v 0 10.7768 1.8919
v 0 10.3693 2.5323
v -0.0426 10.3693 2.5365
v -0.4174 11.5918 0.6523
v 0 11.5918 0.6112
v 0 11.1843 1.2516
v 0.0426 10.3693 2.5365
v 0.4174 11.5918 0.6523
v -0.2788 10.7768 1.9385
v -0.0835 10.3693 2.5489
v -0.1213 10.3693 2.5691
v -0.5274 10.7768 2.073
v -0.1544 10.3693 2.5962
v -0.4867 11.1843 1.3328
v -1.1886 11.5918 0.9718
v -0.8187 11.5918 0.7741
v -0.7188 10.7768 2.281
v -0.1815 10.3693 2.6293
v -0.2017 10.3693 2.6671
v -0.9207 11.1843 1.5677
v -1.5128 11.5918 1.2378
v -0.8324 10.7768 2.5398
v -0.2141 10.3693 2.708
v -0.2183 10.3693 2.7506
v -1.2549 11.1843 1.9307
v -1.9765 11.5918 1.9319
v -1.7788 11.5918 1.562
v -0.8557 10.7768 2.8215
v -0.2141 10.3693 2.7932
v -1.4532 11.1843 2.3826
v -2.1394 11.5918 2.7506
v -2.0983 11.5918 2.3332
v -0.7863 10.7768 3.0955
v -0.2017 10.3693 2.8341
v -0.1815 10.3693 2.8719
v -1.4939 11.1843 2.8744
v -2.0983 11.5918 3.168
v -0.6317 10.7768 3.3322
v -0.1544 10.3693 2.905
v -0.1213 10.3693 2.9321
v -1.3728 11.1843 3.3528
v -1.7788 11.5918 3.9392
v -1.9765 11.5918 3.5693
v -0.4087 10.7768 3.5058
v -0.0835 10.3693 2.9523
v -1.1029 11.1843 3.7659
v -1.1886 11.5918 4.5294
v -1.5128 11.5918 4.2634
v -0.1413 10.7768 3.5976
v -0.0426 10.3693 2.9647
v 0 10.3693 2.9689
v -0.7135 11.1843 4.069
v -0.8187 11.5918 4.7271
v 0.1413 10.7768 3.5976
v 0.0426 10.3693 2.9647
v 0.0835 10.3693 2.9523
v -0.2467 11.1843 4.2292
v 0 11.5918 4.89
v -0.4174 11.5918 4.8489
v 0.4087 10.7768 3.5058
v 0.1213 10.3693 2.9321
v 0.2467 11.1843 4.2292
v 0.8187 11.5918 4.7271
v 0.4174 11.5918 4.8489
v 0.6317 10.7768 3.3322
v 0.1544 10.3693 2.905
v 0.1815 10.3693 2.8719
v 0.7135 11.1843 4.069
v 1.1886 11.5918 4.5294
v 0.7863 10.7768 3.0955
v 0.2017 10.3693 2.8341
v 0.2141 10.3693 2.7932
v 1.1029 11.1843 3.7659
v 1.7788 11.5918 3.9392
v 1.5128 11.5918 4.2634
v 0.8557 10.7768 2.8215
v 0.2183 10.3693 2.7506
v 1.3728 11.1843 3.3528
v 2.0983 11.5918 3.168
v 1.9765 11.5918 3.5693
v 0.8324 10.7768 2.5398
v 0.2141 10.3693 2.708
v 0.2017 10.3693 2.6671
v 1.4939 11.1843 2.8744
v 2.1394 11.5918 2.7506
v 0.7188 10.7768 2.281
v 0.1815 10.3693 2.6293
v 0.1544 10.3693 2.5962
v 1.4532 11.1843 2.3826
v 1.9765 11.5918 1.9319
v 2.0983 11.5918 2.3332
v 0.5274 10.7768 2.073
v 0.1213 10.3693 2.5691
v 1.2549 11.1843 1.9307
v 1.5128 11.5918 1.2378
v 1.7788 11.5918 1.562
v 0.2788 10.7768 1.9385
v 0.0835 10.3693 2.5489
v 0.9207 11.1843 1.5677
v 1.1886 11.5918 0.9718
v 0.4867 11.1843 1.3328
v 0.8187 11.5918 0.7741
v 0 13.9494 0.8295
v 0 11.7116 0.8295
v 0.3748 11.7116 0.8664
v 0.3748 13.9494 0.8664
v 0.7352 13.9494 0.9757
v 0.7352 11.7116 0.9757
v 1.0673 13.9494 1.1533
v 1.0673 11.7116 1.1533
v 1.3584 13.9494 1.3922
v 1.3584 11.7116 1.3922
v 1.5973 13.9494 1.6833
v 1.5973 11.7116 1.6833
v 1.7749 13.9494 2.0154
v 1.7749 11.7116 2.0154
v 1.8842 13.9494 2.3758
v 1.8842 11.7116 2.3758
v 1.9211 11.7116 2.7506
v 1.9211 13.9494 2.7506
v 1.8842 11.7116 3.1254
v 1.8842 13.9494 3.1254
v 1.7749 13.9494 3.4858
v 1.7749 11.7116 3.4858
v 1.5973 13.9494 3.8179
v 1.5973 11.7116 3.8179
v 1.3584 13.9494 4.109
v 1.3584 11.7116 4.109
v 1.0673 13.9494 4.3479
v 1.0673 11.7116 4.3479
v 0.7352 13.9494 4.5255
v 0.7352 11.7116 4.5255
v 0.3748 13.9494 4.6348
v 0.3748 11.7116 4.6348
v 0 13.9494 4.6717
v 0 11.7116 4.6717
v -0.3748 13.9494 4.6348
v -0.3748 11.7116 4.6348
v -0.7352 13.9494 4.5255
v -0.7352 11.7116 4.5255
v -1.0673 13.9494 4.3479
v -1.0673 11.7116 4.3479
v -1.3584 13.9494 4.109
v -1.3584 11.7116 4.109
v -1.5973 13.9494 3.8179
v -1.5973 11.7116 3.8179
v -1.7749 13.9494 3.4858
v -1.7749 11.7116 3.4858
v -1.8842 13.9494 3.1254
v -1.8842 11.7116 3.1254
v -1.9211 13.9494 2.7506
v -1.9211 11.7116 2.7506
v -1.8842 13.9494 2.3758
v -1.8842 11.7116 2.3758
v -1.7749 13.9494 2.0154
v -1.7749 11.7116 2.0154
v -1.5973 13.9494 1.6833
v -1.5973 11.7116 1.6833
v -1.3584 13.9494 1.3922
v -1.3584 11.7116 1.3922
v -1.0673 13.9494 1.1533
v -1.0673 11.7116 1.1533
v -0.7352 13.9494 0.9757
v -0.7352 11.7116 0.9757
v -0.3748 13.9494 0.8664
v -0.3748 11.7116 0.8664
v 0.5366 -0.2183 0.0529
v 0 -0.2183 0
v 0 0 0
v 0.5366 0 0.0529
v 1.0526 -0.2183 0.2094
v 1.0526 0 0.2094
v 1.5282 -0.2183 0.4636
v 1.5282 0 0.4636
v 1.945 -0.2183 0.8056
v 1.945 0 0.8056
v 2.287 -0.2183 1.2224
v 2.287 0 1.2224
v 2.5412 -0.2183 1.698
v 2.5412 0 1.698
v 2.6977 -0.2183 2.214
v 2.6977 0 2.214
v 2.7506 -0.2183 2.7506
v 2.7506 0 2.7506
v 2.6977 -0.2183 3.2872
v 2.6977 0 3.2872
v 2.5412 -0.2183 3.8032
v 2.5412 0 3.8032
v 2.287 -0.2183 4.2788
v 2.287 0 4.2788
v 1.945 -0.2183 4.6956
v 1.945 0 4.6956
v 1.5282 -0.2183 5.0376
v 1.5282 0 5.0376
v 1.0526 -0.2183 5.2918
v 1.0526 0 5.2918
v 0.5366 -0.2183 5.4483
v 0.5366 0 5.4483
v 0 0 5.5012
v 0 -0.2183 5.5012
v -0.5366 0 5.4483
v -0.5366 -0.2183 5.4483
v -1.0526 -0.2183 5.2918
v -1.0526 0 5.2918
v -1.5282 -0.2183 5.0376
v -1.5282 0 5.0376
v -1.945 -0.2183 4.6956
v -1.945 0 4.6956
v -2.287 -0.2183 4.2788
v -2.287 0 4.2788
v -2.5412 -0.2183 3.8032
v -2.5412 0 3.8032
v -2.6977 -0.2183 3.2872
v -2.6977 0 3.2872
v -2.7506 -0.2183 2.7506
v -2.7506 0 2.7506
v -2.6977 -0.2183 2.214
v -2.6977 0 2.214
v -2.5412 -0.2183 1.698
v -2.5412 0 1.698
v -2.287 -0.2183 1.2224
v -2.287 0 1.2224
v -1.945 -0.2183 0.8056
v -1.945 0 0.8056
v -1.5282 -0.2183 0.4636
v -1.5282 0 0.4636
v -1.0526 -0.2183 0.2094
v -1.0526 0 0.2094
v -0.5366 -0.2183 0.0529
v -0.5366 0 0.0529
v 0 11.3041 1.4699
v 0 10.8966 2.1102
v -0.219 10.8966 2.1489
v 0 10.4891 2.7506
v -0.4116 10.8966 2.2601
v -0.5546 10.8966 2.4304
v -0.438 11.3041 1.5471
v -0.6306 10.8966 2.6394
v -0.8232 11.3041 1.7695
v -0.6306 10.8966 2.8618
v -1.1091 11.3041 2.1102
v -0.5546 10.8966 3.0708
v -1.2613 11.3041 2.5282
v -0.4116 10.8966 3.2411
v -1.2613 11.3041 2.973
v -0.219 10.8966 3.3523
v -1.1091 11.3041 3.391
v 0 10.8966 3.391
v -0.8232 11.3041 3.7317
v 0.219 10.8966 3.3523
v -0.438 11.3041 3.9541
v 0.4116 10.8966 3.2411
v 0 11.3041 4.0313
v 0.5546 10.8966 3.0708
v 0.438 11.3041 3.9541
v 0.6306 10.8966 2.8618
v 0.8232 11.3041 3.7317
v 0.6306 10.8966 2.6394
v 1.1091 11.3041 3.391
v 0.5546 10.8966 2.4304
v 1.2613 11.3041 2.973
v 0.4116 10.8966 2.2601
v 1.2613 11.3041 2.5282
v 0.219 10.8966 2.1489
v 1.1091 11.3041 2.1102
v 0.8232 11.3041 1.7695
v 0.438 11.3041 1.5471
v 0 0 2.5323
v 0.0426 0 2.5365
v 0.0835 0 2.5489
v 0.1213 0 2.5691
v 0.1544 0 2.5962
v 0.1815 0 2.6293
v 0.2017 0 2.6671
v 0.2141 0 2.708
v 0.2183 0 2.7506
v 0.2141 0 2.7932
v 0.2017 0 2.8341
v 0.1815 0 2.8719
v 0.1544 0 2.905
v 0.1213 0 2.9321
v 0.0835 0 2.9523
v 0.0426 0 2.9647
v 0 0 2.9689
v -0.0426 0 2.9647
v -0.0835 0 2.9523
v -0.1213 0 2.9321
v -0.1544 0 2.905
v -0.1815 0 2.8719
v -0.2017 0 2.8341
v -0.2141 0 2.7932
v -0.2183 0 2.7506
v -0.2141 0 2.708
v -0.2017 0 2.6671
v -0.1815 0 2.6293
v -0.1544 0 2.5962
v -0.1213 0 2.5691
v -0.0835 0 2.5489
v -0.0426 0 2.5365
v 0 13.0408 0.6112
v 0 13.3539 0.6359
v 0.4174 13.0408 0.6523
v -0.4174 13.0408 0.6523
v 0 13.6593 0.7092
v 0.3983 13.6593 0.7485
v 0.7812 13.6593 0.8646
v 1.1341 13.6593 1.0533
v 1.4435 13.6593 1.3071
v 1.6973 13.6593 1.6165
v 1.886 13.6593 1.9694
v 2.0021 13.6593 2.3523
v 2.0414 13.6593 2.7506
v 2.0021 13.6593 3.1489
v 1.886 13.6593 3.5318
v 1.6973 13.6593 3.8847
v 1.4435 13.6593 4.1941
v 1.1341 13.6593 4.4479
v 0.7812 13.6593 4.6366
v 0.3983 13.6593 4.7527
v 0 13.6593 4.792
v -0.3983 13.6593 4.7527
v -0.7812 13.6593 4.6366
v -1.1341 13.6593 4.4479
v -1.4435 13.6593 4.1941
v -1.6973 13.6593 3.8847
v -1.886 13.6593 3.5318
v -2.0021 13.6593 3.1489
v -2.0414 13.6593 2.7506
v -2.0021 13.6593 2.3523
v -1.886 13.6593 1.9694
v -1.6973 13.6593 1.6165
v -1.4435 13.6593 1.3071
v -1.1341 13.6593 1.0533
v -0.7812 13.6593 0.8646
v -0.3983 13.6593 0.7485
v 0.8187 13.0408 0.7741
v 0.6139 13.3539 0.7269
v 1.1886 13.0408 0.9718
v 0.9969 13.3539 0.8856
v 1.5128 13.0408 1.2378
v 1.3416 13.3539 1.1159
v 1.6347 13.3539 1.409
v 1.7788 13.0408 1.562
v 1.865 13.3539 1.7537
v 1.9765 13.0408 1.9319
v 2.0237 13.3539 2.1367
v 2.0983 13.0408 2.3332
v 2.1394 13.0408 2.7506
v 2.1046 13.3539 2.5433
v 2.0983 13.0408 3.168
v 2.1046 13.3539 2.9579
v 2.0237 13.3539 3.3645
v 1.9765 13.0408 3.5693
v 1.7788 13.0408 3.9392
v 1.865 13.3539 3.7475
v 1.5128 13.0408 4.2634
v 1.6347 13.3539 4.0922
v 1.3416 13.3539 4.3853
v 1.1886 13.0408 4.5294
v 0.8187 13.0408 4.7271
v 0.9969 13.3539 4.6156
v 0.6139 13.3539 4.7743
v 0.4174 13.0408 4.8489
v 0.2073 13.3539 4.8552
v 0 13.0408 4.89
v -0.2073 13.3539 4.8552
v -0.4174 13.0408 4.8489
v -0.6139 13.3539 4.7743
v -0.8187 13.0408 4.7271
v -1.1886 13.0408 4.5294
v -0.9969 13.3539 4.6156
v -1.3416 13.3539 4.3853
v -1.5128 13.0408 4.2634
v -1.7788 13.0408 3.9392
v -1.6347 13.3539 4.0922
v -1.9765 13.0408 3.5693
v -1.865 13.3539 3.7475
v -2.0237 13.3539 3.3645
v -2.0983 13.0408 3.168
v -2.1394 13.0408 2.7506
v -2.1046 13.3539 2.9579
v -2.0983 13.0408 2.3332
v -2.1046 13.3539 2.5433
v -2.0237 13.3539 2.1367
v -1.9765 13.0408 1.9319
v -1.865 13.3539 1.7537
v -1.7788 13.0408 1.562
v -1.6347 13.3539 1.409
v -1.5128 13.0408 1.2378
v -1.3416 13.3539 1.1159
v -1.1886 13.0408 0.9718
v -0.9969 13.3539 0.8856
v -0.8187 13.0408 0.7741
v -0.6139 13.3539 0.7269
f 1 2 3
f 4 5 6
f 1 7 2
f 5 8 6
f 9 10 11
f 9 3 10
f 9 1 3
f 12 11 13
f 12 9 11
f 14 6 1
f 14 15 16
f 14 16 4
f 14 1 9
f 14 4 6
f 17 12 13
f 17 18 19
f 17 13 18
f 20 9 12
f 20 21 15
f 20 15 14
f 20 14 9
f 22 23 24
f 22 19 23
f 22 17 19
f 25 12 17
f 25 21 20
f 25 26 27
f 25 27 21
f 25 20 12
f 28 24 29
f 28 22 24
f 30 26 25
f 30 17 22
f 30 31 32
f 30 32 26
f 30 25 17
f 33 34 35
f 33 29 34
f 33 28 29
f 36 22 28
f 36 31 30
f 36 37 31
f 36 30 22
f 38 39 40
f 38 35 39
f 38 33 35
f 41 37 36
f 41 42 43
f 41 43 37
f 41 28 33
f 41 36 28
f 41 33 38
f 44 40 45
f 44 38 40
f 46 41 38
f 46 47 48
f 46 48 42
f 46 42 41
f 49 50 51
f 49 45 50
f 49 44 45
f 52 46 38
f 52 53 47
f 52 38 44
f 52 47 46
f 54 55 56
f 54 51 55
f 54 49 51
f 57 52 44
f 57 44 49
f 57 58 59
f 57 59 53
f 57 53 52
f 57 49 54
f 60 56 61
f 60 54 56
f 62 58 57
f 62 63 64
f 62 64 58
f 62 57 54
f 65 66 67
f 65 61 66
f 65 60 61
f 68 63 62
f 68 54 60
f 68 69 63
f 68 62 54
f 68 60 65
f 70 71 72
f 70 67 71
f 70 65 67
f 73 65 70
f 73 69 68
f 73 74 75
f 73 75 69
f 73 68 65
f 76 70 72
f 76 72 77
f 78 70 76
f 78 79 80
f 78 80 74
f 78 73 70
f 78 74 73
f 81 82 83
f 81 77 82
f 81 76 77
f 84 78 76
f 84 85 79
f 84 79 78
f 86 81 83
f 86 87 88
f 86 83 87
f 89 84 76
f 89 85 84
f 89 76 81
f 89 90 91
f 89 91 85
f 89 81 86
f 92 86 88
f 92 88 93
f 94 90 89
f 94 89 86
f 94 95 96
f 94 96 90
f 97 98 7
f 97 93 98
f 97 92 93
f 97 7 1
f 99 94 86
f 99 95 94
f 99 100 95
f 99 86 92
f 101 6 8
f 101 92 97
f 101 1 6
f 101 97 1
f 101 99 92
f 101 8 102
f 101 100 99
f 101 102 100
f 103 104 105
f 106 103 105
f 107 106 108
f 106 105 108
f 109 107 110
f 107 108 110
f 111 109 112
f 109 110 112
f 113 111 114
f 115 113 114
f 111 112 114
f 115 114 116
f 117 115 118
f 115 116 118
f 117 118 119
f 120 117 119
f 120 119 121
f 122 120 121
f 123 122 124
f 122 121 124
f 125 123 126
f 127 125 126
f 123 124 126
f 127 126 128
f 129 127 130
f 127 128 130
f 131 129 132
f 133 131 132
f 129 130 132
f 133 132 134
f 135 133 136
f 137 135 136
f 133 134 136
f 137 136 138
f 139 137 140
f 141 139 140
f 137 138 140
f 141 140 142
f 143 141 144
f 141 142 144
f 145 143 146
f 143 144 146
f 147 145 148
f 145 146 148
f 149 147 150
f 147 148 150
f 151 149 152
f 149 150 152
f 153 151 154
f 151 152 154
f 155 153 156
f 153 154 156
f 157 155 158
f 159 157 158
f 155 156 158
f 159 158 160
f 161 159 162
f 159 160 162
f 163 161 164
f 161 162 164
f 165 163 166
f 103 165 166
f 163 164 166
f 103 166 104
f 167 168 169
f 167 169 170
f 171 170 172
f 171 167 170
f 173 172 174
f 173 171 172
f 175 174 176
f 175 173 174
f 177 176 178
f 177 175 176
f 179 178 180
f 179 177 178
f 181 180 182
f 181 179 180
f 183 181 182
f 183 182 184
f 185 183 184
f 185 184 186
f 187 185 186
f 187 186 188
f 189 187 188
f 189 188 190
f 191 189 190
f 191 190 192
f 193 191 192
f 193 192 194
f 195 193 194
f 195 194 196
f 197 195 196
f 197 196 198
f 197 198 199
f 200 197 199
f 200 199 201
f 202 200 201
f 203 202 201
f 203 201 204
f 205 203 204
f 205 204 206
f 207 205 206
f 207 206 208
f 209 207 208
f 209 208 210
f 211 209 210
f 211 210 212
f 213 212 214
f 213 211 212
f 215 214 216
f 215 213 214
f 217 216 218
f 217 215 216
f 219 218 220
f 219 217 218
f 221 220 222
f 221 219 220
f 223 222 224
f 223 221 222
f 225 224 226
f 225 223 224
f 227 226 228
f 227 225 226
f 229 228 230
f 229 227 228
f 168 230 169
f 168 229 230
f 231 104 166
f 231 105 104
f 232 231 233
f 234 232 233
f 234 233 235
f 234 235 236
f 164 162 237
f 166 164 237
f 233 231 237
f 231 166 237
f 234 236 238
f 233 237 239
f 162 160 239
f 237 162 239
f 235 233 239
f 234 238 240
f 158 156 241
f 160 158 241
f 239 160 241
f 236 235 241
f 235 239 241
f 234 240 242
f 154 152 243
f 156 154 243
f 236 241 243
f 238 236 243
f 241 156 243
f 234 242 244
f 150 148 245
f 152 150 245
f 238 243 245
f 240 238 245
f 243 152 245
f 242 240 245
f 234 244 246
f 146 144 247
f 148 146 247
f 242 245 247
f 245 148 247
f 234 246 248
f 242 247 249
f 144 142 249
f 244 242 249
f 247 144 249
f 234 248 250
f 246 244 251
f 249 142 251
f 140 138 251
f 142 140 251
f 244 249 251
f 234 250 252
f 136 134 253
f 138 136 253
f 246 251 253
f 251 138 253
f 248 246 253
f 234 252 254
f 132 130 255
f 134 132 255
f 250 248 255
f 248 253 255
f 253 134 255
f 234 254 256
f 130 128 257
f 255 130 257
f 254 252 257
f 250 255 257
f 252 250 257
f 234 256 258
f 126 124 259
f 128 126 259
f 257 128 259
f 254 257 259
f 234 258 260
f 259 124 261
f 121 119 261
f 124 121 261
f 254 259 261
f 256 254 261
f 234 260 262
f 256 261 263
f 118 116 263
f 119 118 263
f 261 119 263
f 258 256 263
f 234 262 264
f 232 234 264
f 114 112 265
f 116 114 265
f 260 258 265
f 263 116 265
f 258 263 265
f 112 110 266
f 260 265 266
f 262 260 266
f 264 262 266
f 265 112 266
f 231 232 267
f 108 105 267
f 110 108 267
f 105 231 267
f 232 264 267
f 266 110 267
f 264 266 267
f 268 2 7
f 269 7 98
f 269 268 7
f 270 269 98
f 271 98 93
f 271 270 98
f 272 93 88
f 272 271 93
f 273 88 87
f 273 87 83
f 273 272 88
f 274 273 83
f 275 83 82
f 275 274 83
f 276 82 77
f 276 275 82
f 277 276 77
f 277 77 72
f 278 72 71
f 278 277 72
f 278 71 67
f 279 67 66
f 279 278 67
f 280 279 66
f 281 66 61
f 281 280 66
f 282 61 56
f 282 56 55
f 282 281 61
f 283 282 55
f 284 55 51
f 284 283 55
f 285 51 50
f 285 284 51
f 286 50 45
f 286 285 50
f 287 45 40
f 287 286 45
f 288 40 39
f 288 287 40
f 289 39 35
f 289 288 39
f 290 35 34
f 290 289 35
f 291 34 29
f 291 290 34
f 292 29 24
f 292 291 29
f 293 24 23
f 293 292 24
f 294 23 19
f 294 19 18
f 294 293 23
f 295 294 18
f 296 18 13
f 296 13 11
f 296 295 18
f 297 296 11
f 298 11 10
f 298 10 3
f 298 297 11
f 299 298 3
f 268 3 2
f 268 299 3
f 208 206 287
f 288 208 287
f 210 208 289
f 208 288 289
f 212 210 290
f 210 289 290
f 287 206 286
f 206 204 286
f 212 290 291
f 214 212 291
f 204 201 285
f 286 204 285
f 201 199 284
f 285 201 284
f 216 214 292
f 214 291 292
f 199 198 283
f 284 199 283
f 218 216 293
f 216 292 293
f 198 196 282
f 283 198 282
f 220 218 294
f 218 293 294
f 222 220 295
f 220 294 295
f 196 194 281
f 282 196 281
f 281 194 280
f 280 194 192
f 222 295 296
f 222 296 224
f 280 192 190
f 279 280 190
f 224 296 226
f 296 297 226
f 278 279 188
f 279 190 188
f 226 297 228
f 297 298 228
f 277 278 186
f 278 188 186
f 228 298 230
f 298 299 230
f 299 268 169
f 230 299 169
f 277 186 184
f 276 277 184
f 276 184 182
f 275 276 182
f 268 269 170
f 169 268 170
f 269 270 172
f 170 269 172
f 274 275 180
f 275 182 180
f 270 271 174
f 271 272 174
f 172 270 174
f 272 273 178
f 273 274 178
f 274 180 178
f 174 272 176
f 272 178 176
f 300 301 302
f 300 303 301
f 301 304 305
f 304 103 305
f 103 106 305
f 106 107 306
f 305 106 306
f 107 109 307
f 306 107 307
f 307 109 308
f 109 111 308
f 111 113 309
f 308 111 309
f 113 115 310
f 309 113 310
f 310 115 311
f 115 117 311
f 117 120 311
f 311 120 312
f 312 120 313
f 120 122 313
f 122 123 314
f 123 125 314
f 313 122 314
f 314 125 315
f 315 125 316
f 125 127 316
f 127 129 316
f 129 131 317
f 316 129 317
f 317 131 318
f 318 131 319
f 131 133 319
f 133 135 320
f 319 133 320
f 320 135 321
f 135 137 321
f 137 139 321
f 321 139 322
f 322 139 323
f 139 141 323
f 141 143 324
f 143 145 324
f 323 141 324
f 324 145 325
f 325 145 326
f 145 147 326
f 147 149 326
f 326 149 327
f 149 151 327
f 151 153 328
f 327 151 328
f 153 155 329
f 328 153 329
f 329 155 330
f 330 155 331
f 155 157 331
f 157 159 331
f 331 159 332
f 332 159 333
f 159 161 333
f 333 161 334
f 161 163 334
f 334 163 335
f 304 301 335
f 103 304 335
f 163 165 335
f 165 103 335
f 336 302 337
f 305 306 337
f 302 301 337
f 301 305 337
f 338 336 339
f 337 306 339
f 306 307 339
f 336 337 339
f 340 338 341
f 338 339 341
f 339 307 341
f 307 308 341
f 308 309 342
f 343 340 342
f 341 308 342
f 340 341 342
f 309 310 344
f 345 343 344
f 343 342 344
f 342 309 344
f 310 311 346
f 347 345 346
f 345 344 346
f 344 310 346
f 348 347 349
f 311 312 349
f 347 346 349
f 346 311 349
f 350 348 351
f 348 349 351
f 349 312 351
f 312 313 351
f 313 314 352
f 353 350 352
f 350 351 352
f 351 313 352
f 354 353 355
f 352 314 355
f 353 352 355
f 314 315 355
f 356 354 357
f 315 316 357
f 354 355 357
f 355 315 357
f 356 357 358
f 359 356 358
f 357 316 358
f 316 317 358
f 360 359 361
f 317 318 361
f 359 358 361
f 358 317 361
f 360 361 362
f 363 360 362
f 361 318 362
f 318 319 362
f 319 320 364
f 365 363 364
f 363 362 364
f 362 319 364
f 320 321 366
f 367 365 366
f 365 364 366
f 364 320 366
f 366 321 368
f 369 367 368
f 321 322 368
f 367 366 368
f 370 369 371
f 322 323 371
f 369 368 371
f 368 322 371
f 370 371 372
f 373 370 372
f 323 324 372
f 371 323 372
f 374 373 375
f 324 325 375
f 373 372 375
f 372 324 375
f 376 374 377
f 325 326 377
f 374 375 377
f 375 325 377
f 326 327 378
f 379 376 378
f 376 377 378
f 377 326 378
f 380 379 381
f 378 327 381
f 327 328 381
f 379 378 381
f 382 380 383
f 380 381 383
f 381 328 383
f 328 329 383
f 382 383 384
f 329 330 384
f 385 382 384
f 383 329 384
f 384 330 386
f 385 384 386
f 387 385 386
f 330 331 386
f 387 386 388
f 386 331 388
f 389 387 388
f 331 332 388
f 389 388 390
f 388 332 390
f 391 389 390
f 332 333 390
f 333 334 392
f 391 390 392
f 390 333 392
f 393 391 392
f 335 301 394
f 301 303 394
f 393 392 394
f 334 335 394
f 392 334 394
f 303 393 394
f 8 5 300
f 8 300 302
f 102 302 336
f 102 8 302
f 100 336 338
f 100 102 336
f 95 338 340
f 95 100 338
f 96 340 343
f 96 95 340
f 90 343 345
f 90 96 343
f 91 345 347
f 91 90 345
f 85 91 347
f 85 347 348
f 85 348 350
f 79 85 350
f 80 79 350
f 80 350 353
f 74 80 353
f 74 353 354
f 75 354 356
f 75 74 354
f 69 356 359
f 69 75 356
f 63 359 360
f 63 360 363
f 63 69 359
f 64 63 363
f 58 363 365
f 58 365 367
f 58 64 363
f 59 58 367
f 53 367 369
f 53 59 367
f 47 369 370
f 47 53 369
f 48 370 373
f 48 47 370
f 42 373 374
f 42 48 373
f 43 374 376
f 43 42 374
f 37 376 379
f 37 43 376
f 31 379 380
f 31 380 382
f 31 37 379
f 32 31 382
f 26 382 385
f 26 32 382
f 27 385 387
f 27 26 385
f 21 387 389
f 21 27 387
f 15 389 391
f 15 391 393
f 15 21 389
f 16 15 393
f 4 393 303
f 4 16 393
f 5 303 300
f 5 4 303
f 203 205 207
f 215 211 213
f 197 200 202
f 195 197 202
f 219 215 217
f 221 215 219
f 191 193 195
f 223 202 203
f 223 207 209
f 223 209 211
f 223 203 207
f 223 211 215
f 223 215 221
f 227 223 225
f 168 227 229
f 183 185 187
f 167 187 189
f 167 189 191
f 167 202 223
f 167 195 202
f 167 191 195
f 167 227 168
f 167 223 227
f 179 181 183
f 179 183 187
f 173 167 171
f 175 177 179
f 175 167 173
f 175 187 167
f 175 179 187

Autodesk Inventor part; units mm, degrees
ref_plane "YZ Plane" through (0, 0, 0) normal (1, 0, 0) x (0, 1, 0)
ref_plane "XZ Plane" through (0, 0, 0) normal (0, 1, 0) x (-1, 0, 0)
ref_plane "XY Plane" through (0, 0, 0) normal (0, 0, 1) x (1, 0, 0)
sketch "Sketch1" plane through (0, 0, 0) normal (1, 0, 0) x (0, 1, 0)
  line L0 (13.9494, 0.6112) -> (11.5918, 0.6112)
  line L1 (11.5918, 0.6112) -> (10.3693, 2.5323)
  line L2 (10.3693, 2.5323) -> (0, 2.5323)
  line L3 (0, 2.5323) -> (0, 0)
  line L4 (13.9494, 0.8295) -> (11.7116, 0.8295)
  line L5 (11.7116, 0.8295) -> (10.4891, 2.7506)
  line L6 (10.4891, 2.7506) -> (-0.2183, 2.7506)
  line L7 (-0.2183, 2.7506) -> (-0.2183, 0)
  line L8 (13.9494, 0.8295) -> (13.9494, 0.6112)
  line L9 (0, 0) -> (-0.2183, 0)
revolve "Revolution1" add sketch "Sketch1" angle 360 about axis through (0, 10.4891, 2.7506) along (0, -1, 0)
fillet "Fillet1" radius 2 1 edges at (0, 13.9494, 4.8899)
properties part number "Magic 3D Sketch" material "UHMW, Black"
